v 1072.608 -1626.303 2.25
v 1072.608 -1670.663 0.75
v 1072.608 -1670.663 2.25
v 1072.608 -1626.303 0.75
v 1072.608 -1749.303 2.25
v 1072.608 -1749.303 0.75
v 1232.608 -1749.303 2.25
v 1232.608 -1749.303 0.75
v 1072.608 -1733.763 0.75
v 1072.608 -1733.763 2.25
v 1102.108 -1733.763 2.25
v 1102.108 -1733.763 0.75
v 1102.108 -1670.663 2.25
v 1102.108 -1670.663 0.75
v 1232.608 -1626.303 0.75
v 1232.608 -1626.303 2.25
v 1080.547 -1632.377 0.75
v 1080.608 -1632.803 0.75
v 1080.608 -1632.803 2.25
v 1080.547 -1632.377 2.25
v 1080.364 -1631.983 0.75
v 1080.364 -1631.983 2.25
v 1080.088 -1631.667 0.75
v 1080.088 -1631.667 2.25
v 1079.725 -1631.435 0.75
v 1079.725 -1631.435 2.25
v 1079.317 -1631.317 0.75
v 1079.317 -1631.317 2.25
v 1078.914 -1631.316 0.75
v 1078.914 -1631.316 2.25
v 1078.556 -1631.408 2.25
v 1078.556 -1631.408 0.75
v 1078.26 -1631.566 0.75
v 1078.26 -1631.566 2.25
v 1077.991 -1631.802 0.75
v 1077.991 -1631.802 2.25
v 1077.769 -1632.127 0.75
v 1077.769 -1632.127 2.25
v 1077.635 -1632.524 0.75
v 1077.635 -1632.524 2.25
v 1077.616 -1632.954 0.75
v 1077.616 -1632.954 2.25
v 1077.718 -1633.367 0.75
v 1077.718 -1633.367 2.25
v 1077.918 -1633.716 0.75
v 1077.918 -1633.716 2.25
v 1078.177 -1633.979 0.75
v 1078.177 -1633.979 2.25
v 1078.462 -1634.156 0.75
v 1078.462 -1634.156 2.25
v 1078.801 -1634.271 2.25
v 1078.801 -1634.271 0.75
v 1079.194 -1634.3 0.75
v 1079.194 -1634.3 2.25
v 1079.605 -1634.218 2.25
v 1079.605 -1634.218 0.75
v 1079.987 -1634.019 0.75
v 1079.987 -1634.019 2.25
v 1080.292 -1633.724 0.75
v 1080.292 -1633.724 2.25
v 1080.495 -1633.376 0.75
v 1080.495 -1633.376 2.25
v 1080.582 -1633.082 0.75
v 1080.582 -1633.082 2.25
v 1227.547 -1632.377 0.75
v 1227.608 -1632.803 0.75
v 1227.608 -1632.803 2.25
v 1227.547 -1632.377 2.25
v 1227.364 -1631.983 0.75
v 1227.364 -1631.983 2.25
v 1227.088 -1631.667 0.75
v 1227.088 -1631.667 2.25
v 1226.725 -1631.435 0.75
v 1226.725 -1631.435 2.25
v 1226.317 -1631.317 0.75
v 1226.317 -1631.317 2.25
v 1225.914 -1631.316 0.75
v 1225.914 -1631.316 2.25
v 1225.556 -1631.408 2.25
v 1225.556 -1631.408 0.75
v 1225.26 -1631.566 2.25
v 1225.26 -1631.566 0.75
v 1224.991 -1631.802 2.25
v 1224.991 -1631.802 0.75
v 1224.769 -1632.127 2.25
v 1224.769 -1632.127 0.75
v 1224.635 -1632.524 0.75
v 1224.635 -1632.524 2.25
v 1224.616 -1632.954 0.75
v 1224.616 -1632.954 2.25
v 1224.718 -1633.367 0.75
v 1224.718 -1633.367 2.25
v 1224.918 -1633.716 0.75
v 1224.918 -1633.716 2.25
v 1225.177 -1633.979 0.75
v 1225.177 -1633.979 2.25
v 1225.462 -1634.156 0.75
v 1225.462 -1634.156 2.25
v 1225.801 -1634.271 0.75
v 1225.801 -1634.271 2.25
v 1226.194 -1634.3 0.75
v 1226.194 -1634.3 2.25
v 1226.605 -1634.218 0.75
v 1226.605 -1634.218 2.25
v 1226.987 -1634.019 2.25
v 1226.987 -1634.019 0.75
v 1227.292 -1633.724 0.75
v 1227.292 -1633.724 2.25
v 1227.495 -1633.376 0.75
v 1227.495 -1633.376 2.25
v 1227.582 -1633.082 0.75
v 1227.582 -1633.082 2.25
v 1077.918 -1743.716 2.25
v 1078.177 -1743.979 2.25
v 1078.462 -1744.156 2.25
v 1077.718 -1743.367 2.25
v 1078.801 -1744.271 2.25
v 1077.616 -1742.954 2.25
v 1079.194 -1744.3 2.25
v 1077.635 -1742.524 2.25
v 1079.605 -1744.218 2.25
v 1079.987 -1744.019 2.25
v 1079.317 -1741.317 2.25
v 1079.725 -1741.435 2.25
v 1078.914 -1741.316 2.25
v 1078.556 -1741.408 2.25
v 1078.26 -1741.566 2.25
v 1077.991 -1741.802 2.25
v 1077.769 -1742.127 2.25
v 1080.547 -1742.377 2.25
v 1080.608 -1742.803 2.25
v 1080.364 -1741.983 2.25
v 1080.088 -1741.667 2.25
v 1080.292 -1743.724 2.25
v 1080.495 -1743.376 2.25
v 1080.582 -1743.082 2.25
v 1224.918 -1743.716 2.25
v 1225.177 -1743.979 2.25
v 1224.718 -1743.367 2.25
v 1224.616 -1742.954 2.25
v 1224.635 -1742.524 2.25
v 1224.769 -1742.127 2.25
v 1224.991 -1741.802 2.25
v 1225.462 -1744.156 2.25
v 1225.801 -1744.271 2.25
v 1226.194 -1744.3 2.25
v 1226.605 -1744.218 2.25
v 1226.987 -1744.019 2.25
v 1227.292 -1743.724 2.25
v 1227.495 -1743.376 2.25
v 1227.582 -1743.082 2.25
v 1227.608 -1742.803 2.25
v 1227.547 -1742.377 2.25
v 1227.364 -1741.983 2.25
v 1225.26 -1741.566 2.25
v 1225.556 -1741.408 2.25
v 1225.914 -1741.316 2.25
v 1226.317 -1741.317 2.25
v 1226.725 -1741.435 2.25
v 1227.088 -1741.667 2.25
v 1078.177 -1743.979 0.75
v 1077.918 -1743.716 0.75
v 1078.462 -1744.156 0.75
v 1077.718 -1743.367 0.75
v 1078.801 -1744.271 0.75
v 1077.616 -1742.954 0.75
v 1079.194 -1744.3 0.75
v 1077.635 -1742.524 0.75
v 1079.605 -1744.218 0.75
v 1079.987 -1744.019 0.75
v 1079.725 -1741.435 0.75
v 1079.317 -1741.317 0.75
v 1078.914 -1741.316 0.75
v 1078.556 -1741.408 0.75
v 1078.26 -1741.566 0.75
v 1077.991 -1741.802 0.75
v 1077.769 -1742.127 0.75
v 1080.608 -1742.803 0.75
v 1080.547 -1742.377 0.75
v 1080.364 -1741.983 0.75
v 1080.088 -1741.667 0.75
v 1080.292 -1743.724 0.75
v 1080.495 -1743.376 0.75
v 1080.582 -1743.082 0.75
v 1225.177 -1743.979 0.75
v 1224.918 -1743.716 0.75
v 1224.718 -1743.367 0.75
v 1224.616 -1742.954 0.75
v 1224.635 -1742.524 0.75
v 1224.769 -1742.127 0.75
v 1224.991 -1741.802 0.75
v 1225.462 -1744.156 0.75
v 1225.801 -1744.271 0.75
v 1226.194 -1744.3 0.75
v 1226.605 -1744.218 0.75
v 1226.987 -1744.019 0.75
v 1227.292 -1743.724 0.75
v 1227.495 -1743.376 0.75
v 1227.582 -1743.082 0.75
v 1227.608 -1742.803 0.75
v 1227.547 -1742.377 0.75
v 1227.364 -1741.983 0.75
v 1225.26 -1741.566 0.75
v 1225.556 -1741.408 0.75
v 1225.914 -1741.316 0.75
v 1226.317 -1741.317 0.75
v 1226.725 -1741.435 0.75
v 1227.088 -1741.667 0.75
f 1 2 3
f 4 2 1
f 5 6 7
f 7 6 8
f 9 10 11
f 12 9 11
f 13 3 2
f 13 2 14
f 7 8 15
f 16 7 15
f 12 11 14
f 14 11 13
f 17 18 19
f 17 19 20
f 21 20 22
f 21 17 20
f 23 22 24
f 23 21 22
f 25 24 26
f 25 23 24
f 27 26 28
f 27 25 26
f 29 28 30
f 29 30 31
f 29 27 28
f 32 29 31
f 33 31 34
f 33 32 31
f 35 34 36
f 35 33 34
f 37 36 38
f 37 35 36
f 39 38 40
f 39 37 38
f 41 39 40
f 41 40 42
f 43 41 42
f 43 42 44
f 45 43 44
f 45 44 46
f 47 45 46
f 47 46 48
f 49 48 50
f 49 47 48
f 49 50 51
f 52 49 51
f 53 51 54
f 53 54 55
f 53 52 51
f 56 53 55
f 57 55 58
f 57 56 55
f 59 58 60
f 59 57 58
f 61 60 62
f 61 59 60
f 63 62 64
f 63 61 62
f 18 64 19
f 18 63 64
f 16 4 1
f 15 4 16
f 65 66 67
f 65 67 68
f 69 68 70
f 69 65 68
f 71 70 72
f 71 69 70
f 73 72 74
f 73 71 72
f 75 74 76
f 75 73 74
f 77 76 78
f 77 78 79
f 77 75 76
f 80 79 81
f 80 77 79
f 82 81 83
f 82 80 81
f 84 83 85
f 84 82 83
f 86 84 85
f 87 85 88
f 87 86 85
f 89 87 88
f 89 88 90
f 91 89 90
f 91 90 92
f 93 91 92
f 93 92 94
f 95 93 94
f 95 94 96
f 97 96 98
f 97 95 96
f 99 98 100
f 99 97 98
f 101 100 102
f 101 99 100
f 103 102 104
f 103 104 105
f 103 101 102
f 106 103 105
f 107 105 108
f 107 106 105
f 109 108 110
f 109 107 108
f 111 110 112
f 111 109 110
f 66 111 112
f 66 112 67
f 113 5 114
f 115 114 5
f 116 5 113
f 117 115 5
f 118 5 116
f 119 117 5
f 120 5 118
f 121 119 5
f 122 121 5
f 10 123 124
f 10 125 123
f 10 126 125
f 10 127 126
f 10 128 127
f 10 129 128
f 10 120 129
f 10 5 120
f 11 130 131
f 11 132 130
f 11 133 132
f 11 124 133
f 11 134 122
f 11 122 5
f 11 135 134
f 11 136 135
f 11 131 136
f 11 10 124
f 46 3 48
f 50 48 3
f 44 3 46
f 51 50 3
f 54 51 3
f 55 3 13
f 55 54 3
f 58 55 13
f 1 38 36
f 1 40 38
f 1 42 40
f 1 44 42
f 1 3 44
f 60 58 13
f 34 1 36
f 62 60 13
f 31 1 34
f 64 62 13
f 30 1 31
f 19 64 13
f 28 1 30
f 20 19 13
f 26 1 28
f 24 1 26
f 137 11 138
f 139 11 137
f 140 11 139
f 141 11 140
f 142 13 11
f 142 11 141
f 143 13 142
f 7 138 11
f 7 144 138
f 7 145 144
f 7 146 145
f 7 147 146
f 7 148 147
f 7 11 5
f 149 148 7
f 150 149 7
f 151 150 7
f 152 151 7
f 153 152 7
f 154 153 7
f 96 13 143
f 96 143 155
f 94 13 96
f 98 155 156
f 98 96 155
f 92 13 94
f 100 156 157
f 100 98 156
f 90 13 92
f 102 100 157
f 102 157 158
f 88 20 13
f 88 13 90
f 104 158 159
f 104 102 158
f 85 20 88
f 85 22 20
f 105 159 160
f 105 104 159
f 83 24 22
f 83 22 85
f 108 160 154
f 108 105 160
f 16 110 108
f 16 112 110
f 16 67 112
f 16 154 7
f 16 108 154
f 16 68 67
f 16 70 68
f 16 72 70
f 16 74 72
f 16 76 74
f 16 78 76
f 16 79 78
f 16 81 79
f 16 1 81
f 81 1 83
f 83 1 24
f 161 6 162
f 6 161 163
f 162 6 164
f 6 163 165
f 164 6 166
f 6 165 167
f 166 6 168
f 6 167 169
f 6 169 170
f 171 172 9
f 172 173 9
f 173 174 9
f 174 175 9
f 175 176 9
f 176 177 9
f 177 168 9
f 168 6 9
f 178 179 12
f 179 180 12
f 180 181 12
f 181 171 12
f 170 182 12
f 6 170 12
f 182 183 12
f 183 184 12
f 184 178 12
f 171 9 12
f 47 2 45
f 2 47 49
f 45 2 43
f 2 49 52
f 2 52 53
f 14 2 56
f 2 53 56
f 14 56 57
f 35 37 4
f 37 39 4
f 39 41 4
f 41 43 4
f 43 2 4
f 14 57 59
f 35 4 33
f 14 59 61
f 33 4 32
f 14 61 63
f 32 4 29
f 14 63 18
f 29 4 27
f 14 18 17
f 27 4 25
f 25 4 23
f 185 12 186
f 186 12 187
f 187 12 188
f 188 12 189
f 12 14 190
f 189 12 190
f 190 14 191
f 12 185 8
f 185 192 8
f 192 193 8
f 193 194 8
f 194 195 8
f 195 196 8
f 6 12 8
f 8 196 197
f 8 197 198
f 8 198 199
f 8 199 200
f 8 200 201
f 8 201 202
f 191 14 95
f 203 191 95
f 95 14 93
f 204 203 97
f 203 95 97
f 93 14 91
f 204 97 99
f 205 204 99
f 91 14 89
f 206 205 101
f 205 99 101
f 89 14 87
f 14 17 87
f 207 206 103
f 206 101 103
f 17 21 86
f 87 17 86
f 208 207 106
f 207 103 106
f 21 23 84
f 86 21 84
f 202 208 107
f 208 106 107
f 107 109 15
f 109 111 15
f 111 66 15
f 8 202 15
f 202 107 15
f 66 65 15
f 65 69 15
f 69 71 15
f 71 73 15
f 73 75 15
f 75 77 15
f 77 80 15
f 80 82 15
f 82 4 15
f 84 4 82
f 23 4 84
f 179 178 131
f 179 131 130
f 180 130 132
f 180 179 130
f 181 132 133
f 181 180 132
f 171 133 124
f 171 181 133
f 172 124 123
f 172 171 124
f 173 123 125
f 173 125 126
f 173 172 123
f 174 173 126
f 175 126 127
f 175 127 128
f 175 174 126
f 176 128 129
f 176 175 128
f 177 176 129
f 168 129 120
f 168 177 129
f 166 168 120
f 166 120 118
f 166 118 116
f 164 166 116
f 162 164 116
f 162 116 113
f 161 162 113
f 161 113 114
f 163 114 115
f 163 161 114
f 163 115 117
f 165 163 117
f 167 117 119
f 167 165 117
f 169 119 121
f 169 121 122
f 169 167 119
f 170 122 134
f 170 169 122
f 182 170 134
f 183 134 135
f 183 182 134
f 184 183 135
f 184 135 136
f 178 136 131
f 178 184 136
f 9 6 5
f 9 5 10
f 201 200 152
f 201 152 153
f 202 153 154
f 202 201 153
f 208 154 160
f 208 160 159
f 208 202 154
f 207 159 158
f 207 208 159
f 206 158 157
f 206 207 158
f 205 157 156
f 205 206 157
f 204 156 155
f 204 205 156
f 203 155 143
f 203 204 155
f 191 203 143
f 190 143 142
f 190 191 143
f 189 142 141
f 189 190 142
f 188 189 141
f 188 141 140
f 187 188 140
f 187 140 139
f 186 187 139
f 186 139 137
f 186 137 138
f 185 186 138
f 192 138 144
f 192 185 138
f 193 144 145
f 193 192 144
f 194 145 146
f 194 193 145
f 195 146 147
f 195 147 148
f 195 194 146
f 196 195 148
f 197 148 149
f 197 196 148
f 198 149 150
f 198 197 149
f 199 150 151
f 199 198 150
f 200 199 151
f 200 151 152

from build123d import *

# Parameters (mm, degrees)
SKETCH_1_W          = 1600
SKETCH_1_H          = 1230
SKETCH_1_R          = 15
EXTRUDE_1_DEPTH     = 3
SCALE_1_SCALE_X     = 0.1
SCALE_1_SCALE_Y     = 0.1
SCALE_1_SCALE_Z     = 0.5
SKETCH_2_W          = 29.5
SKETCH_2_H          = 63.1
CUT_EXTRUDE_1_DEPTH = 2.5000001


with BuildPart() as part:
    # 草图1 → 凸台-拉伸1 (new body)
    with BuildSketch(Plane.XY):
        with Locations((1152.60835314, -1687.80288964)):
            Rectangle(SKETCH_1_W, SKETCH_1_H)
        with Locations((417.60835314, -1137.80288964)):
            Circle(SKETCH_1_R, mode=Mode.SUBTRACT)
        with Locations((1887.60835314, -1137.80288964)):
            Circle(SKETCH_1_R, mode=Mode.SUBTRACT)
        with Locations((1887.60835314, -2237.80288964)):
            Circle(SKETCH_1_R, mode=Mode.SUBTRACT)
        with Locations((417.60835314, -2237.80288964)):
            Circle(SKETCH_1_R, mode=Mode.SUBTRACT)
    extrude(amount=EXTRUDE_1_DEPTH)


with BuildPart() as part_1:
    # 缩放比例1: scaled about (1152.60835314, -1687.80288964, 1.5)
    add(part.part.scale((SCALE_1_SCALE_X, SCALE_1_SCALE_Y, SCALE_1_SCALE_Z), about=(1152.60835314, -1687.80288964, 1.5)))

    # 草图2 → 切除-拉伸1 (cut, through all)
    with BuildSketch(Plane.XY.offset(2.25)):
        with Locations((1087.35835314, -1702.21288964)):
            Rectangle(SKETCH_2_W, SKETCH_2_H)
    extrude(amount=-CUT_EXTRUDE_1_DEPTH, mode=Mode.SUBTRACT)


solid = part_1.part
